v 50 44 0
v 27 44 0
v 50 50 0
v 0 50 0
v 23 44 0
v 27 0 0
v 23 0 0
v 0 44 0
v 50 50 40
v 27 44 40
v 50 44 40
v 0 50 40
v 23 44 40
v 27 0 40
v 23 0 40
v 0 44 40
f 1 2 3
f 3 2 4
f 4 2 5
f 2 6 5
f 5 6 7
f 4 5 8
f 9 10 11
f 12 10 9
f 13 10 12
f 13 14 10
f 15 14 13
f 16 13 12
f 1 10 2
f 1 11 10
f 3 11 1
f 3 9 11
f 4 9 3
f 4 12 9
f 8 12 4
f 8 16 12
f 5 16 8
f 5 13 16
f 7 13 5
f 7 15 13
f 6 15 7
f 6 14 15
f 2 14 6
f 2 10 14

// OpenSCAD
$fn = 32;

// ----------------------------------------------------------------------
// Structural section: tee 50 x 50 mm
// ----------------------------------------------------------------------

// --- parameters (mm) ---
sec_w = 50;               // tee width, X
sec_h = 50;               // tee height, Y
flange_t = 6;             // top flange thickness
web_t = 4;                // web thickness
plate_t = 40;             // cut length, Z (extrusion height)
fit_tol = 0.05;           // declared fit tolerance (prompt contract)
free_tol = 0.3;           // declared free tolerance (prompt contract)

profile = [[23, 0], [27, 0], [27, 44], [50, 44], [50, 50], [0, 50], [0, 44], [23, 44]];  // primary outline, 8 points, counter clockwise

// --- the one profile operation ---
linear_extrude(height = plate_t) polygon(points = profile);
